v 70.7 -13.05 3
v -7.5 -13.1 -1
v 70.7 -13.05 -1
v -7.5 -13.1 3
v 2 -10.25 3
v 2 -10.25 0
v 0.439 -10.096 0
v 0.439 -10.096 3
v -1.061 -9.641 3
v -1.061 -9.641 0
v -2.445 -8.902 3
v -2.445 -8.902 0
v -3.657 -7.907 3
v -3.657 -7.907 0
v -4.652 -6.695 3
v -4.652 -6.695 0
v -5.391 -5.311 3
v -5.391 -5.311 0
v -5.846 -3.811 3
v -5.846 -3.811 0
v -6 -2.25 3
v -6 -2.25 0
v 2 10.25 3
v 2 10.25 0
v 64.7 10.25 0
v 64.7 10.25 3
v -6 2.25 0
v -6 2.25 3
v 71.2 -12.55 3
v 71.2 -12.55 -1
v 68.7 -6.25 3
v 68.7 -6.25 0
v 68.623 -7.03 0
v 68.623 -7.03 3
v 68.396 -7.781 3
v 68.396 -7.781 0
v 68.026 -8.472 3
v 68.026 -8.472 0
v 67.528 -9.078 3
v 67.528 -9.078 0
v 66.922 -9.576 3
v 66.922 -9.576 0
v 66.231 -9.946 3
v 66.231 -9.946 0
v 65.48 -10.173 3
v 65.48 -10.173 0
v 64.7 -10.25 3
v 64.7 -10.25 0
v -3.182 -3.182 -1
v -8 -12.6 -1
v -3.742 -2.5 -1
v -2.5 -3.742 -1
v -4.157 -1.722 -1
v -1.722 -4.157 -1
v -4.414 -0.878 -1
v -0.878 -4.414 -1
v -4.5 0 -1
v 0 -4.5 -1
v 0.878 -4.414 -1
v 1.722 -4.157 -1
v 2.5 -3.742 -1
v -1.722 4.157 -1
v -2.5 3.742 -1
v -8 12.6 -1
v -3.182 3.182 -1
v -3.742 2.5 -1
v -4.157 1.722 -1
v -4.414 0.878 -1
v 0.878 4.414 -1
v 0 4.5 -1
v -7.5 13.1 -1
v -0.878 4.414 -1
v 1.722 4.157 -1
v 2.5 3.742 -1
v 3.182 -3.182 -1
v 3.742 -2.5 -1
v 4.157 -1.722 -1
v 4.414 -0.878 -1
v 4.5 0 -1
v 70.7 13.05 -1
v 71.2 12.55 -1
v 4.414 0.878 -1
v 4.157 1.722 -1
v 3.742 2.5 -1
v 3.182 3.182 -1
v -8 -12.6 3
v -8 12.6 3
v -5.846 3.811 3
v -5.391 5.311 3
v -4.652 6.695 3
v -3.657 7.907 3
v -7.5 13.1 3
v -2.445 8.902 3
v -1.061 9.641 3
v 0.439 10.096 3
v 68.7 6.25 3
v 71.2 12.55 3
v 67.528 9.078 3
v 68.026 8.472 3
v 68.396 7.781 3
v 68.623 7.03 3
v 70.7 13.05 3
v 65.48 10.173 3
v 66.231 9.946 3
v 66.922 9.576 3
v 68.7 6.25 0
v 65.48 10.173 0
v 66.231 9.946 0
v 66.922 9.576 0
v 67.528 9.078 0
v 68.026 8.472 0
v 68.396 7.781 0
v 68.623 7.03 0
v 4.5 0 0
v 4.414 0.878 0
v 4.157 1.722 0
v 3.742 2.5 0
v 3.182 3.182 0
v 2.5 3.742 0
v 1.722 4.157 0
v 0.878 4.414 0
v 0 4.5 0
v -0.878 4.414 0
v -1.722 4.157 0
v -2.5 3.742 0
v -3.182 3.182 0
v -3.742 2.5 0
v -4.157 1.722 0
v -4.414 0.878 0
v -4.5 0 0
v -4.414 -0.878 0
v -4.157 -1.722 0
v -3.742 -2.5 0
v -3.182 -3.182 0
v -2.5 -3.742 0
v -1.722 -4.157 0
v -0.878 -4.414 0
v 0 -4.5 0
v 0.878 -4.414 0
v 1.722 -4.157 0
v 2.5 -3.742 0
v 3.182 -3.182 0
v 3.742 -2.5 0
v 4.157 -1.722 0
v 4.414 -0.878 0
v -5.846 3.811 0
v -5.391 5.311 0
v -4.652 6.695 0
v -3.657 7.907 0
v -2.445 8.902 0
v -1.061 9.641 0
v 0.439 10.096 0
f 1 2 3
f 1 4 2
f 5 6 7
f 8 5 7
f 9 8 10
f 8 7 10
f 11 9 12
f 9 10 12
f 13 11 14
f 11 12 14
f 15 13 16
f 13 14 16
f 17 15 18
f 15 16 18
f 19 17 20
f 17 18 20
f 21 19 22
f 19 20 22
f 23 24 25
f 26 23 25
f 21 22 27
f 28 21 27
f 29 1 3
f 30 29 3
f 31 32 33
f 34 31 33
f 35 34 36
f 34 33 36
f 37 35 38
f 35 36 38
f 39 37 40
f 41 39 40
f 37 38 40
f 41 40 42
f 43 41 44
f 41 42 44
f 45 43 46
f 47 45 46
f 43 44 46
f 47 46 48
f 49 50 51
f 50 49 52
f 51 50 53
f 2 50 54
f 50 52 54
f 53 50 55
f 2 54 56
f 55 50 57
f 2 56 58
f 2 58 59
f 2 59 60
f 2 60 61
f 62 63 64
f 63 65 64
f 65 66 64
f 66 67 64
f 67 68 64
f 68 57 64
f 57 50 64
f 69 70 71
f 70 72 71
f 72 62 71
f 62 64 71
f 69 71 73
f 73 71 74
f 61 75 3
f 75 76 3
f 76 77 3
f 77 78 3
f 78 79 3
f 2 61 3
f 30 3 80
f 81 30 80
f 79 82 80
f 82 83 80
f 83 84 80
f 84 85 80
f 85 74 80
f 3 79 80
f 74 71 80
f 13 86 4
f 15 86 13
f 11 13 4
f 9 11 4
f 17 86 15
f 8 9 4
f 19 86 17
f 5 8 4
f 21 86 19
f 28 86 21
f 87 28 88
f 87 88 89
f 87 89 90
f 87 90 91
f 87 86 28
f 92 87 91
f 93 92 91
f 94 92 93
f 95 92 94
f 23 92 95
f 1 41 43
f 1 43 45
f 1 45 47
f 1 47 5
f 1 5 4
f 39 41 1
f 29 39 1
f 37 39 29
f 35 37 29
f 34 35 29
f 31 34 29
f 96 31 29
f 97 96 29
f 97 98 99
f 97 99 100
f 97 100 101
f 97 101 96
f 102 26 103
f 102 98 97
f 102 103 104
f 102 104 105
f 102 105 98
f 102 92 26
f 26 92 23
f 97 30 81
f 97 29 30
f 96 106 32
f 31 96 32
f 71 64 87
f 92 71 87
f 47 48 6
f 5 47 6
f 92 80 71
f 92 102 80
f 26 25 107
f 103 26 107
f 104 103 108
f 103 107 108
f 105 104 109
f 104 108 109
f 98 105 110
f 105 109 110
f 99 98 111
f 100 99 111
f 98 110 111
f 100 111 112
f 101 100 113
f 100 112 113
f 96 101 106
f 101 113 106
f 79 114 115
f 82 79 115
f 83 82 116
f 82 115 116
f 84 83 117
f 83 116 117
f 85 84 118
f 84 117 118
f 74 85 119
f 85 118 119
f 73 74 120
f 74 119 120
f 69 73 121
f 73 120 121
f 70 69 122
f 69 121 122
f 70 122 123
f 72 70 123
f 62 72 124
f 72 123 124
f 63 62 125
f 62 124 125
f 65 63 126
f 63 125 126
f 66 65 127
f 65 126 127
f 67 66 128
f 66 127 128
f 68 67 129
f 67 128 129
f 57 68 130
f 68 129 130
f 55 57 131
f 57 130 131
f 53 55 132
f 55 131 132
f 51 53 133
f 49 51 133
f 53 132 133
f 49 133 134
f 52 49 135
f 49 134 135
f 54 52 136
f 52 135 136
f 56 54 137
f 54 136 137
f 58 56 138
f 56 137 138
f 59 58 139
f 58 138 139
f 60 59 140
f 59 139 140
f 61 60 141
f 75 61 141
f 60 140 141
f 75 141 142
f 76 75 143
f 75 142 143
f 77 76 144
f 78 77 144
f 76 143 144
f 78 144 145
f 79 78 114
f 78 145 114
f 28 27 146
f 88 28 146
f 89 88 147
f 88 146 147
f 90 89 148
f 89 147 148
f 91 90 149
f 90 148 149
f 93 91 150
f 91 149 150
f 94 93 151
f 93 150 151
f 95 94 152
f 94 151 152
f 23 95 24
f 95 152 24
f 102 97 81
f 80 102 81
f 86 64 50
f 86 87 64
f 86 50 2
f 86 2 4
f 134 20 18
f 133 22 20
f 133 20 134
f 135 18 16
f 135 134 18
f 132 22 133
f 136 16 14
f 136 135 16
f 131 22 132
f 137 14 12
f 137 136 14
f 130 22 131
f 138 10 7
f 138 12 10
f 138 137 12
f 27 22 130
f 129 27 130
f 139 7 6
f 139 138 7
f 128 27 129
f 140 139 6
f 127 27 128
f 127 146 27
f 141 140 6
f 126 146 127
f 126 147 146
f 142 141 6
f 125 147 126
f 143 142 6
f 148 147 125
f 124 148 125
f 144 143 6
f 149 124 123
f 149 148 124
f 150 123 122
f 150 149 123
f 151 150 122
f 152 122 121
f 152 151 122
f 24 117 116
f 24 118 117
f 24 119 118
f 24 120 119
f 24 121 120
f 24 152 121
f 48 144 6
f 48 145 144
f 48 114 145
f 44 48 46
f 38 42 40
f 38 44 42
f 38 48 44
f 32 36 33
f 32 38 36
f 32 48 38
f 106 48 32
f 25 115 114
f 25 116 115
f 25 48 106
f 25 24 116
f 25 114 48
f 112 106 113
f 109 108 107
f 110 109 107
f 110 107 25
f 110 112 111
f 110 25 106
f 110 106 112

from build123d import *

# Parameters (mm, degrees)
F1_DEPTH = 3
F0_R     = 4.5
F2_DEPTH = 1
F3_SIZE  = 0.5


with BuildPart() as f1:
    # F0 (on Top) → F1 (new body)
    with BuildSketch(Plane.XY):
        Polygon((71.2, 13.05), (-8, 13.1), (-8, -13.1), (71.2, -13.05), align=None)
        with BuildLine():
            ThreePointArc((-6, 2.25), (-3.6568542495, 7.9068542495), (2, 10.25))
            Line((2, 10.25), (64.7, 10.25))
            ThreePointArc((64.7, 10.25), (67.5284271247, 9.0784271247), (68.7, 6.25))
            Line((68.7, 6.25), (68.7, -6.25))
            ThreePointArc((68.7, -6.25), (67.5284271247, -9.0784271247), (64.7, -10.25))
            Line((64.7, -10.25), (2, -10.25))
            ThreePointArc((2, -10.25), (-3.6568542495, -7.9068542495), (-6, -2.25))
            Line((-6, -2.25), (-6, 2.25))
        make_face(mode=Mode.SUBTRACT)
    extrude(amount=F1_DEPTH)

    # F0 (on Top) → F2 (join)
    with BuildSketch(Plane.XY):
        Polygon((71.2, 13.05), (-8, 13.1), (-8, -13.1), (71.2, -13.05), align=None)
        with BuildLine():
            ThreePointArc((-6, 2.25), (-3.6568542495, 7.9068542495), (2, 10.25))
            Line((2, 10.25), (64.7, 10.25))
            ThreePointArc((64.7, 10.25), (67.5284271247, 9.0784271247), (68.7, 6.25))
            Line((68.7, 6.25), (68.7, -6.25))
            ThreePointArc((68.7, -6.25), (67.5284271247, -9.0784271247), (64.7, -10.25))
            Line((64.7, -10.25), (2, -10.25))
            ThreePointArc((2, -10.25), (-3.6568542495, -7.9068542495), (-6, -2.25))
            Line((-6, -2.25), (-6, 2.25))
        make_face(mode=Mode.SUBTRACT)
        with BuildLine():
            Line((64.7, 10.25), (2, 10.25))
            ThreePointArc((2, 10.25), (-3.6568542495, 7.9068542495), (-6, 2.25))
            Line((-6, 2.25), (-6, -2.25))
            ThreePointArc((-6, -2.25), (-3.6568542495, -7.9068542495), (2, -10.25))
            Line((2, -10.25), (64.7, -10.25))
            ThreePointArc((64.7, -10.25), (67.5284271247, -9.0784271247), (68.7, -6.25))
            Line((68.7, -6.25), (68.7, 6.25))
            ThreePointArc((68.7, 6.25), (67.5284271247, 9.0784271247), (64.7, 10.25))
        make_face()
        Circle(F0_R, mode=Mode.SUBTRACT)
    extrude(amount=-F2_DEPTH)

    # F3
    f3_edges = [f1.edges().sort_by_distance(p)[0] for p in [
        (-8, -13.1, 1),
        (-8, 13.1, 1),
        (71.2, -13.05, 1),
        (71.2, 13.05, 1),
    ]]
    chamfer(f3_edges, length=F3_SIZE)


solid = f1.part
